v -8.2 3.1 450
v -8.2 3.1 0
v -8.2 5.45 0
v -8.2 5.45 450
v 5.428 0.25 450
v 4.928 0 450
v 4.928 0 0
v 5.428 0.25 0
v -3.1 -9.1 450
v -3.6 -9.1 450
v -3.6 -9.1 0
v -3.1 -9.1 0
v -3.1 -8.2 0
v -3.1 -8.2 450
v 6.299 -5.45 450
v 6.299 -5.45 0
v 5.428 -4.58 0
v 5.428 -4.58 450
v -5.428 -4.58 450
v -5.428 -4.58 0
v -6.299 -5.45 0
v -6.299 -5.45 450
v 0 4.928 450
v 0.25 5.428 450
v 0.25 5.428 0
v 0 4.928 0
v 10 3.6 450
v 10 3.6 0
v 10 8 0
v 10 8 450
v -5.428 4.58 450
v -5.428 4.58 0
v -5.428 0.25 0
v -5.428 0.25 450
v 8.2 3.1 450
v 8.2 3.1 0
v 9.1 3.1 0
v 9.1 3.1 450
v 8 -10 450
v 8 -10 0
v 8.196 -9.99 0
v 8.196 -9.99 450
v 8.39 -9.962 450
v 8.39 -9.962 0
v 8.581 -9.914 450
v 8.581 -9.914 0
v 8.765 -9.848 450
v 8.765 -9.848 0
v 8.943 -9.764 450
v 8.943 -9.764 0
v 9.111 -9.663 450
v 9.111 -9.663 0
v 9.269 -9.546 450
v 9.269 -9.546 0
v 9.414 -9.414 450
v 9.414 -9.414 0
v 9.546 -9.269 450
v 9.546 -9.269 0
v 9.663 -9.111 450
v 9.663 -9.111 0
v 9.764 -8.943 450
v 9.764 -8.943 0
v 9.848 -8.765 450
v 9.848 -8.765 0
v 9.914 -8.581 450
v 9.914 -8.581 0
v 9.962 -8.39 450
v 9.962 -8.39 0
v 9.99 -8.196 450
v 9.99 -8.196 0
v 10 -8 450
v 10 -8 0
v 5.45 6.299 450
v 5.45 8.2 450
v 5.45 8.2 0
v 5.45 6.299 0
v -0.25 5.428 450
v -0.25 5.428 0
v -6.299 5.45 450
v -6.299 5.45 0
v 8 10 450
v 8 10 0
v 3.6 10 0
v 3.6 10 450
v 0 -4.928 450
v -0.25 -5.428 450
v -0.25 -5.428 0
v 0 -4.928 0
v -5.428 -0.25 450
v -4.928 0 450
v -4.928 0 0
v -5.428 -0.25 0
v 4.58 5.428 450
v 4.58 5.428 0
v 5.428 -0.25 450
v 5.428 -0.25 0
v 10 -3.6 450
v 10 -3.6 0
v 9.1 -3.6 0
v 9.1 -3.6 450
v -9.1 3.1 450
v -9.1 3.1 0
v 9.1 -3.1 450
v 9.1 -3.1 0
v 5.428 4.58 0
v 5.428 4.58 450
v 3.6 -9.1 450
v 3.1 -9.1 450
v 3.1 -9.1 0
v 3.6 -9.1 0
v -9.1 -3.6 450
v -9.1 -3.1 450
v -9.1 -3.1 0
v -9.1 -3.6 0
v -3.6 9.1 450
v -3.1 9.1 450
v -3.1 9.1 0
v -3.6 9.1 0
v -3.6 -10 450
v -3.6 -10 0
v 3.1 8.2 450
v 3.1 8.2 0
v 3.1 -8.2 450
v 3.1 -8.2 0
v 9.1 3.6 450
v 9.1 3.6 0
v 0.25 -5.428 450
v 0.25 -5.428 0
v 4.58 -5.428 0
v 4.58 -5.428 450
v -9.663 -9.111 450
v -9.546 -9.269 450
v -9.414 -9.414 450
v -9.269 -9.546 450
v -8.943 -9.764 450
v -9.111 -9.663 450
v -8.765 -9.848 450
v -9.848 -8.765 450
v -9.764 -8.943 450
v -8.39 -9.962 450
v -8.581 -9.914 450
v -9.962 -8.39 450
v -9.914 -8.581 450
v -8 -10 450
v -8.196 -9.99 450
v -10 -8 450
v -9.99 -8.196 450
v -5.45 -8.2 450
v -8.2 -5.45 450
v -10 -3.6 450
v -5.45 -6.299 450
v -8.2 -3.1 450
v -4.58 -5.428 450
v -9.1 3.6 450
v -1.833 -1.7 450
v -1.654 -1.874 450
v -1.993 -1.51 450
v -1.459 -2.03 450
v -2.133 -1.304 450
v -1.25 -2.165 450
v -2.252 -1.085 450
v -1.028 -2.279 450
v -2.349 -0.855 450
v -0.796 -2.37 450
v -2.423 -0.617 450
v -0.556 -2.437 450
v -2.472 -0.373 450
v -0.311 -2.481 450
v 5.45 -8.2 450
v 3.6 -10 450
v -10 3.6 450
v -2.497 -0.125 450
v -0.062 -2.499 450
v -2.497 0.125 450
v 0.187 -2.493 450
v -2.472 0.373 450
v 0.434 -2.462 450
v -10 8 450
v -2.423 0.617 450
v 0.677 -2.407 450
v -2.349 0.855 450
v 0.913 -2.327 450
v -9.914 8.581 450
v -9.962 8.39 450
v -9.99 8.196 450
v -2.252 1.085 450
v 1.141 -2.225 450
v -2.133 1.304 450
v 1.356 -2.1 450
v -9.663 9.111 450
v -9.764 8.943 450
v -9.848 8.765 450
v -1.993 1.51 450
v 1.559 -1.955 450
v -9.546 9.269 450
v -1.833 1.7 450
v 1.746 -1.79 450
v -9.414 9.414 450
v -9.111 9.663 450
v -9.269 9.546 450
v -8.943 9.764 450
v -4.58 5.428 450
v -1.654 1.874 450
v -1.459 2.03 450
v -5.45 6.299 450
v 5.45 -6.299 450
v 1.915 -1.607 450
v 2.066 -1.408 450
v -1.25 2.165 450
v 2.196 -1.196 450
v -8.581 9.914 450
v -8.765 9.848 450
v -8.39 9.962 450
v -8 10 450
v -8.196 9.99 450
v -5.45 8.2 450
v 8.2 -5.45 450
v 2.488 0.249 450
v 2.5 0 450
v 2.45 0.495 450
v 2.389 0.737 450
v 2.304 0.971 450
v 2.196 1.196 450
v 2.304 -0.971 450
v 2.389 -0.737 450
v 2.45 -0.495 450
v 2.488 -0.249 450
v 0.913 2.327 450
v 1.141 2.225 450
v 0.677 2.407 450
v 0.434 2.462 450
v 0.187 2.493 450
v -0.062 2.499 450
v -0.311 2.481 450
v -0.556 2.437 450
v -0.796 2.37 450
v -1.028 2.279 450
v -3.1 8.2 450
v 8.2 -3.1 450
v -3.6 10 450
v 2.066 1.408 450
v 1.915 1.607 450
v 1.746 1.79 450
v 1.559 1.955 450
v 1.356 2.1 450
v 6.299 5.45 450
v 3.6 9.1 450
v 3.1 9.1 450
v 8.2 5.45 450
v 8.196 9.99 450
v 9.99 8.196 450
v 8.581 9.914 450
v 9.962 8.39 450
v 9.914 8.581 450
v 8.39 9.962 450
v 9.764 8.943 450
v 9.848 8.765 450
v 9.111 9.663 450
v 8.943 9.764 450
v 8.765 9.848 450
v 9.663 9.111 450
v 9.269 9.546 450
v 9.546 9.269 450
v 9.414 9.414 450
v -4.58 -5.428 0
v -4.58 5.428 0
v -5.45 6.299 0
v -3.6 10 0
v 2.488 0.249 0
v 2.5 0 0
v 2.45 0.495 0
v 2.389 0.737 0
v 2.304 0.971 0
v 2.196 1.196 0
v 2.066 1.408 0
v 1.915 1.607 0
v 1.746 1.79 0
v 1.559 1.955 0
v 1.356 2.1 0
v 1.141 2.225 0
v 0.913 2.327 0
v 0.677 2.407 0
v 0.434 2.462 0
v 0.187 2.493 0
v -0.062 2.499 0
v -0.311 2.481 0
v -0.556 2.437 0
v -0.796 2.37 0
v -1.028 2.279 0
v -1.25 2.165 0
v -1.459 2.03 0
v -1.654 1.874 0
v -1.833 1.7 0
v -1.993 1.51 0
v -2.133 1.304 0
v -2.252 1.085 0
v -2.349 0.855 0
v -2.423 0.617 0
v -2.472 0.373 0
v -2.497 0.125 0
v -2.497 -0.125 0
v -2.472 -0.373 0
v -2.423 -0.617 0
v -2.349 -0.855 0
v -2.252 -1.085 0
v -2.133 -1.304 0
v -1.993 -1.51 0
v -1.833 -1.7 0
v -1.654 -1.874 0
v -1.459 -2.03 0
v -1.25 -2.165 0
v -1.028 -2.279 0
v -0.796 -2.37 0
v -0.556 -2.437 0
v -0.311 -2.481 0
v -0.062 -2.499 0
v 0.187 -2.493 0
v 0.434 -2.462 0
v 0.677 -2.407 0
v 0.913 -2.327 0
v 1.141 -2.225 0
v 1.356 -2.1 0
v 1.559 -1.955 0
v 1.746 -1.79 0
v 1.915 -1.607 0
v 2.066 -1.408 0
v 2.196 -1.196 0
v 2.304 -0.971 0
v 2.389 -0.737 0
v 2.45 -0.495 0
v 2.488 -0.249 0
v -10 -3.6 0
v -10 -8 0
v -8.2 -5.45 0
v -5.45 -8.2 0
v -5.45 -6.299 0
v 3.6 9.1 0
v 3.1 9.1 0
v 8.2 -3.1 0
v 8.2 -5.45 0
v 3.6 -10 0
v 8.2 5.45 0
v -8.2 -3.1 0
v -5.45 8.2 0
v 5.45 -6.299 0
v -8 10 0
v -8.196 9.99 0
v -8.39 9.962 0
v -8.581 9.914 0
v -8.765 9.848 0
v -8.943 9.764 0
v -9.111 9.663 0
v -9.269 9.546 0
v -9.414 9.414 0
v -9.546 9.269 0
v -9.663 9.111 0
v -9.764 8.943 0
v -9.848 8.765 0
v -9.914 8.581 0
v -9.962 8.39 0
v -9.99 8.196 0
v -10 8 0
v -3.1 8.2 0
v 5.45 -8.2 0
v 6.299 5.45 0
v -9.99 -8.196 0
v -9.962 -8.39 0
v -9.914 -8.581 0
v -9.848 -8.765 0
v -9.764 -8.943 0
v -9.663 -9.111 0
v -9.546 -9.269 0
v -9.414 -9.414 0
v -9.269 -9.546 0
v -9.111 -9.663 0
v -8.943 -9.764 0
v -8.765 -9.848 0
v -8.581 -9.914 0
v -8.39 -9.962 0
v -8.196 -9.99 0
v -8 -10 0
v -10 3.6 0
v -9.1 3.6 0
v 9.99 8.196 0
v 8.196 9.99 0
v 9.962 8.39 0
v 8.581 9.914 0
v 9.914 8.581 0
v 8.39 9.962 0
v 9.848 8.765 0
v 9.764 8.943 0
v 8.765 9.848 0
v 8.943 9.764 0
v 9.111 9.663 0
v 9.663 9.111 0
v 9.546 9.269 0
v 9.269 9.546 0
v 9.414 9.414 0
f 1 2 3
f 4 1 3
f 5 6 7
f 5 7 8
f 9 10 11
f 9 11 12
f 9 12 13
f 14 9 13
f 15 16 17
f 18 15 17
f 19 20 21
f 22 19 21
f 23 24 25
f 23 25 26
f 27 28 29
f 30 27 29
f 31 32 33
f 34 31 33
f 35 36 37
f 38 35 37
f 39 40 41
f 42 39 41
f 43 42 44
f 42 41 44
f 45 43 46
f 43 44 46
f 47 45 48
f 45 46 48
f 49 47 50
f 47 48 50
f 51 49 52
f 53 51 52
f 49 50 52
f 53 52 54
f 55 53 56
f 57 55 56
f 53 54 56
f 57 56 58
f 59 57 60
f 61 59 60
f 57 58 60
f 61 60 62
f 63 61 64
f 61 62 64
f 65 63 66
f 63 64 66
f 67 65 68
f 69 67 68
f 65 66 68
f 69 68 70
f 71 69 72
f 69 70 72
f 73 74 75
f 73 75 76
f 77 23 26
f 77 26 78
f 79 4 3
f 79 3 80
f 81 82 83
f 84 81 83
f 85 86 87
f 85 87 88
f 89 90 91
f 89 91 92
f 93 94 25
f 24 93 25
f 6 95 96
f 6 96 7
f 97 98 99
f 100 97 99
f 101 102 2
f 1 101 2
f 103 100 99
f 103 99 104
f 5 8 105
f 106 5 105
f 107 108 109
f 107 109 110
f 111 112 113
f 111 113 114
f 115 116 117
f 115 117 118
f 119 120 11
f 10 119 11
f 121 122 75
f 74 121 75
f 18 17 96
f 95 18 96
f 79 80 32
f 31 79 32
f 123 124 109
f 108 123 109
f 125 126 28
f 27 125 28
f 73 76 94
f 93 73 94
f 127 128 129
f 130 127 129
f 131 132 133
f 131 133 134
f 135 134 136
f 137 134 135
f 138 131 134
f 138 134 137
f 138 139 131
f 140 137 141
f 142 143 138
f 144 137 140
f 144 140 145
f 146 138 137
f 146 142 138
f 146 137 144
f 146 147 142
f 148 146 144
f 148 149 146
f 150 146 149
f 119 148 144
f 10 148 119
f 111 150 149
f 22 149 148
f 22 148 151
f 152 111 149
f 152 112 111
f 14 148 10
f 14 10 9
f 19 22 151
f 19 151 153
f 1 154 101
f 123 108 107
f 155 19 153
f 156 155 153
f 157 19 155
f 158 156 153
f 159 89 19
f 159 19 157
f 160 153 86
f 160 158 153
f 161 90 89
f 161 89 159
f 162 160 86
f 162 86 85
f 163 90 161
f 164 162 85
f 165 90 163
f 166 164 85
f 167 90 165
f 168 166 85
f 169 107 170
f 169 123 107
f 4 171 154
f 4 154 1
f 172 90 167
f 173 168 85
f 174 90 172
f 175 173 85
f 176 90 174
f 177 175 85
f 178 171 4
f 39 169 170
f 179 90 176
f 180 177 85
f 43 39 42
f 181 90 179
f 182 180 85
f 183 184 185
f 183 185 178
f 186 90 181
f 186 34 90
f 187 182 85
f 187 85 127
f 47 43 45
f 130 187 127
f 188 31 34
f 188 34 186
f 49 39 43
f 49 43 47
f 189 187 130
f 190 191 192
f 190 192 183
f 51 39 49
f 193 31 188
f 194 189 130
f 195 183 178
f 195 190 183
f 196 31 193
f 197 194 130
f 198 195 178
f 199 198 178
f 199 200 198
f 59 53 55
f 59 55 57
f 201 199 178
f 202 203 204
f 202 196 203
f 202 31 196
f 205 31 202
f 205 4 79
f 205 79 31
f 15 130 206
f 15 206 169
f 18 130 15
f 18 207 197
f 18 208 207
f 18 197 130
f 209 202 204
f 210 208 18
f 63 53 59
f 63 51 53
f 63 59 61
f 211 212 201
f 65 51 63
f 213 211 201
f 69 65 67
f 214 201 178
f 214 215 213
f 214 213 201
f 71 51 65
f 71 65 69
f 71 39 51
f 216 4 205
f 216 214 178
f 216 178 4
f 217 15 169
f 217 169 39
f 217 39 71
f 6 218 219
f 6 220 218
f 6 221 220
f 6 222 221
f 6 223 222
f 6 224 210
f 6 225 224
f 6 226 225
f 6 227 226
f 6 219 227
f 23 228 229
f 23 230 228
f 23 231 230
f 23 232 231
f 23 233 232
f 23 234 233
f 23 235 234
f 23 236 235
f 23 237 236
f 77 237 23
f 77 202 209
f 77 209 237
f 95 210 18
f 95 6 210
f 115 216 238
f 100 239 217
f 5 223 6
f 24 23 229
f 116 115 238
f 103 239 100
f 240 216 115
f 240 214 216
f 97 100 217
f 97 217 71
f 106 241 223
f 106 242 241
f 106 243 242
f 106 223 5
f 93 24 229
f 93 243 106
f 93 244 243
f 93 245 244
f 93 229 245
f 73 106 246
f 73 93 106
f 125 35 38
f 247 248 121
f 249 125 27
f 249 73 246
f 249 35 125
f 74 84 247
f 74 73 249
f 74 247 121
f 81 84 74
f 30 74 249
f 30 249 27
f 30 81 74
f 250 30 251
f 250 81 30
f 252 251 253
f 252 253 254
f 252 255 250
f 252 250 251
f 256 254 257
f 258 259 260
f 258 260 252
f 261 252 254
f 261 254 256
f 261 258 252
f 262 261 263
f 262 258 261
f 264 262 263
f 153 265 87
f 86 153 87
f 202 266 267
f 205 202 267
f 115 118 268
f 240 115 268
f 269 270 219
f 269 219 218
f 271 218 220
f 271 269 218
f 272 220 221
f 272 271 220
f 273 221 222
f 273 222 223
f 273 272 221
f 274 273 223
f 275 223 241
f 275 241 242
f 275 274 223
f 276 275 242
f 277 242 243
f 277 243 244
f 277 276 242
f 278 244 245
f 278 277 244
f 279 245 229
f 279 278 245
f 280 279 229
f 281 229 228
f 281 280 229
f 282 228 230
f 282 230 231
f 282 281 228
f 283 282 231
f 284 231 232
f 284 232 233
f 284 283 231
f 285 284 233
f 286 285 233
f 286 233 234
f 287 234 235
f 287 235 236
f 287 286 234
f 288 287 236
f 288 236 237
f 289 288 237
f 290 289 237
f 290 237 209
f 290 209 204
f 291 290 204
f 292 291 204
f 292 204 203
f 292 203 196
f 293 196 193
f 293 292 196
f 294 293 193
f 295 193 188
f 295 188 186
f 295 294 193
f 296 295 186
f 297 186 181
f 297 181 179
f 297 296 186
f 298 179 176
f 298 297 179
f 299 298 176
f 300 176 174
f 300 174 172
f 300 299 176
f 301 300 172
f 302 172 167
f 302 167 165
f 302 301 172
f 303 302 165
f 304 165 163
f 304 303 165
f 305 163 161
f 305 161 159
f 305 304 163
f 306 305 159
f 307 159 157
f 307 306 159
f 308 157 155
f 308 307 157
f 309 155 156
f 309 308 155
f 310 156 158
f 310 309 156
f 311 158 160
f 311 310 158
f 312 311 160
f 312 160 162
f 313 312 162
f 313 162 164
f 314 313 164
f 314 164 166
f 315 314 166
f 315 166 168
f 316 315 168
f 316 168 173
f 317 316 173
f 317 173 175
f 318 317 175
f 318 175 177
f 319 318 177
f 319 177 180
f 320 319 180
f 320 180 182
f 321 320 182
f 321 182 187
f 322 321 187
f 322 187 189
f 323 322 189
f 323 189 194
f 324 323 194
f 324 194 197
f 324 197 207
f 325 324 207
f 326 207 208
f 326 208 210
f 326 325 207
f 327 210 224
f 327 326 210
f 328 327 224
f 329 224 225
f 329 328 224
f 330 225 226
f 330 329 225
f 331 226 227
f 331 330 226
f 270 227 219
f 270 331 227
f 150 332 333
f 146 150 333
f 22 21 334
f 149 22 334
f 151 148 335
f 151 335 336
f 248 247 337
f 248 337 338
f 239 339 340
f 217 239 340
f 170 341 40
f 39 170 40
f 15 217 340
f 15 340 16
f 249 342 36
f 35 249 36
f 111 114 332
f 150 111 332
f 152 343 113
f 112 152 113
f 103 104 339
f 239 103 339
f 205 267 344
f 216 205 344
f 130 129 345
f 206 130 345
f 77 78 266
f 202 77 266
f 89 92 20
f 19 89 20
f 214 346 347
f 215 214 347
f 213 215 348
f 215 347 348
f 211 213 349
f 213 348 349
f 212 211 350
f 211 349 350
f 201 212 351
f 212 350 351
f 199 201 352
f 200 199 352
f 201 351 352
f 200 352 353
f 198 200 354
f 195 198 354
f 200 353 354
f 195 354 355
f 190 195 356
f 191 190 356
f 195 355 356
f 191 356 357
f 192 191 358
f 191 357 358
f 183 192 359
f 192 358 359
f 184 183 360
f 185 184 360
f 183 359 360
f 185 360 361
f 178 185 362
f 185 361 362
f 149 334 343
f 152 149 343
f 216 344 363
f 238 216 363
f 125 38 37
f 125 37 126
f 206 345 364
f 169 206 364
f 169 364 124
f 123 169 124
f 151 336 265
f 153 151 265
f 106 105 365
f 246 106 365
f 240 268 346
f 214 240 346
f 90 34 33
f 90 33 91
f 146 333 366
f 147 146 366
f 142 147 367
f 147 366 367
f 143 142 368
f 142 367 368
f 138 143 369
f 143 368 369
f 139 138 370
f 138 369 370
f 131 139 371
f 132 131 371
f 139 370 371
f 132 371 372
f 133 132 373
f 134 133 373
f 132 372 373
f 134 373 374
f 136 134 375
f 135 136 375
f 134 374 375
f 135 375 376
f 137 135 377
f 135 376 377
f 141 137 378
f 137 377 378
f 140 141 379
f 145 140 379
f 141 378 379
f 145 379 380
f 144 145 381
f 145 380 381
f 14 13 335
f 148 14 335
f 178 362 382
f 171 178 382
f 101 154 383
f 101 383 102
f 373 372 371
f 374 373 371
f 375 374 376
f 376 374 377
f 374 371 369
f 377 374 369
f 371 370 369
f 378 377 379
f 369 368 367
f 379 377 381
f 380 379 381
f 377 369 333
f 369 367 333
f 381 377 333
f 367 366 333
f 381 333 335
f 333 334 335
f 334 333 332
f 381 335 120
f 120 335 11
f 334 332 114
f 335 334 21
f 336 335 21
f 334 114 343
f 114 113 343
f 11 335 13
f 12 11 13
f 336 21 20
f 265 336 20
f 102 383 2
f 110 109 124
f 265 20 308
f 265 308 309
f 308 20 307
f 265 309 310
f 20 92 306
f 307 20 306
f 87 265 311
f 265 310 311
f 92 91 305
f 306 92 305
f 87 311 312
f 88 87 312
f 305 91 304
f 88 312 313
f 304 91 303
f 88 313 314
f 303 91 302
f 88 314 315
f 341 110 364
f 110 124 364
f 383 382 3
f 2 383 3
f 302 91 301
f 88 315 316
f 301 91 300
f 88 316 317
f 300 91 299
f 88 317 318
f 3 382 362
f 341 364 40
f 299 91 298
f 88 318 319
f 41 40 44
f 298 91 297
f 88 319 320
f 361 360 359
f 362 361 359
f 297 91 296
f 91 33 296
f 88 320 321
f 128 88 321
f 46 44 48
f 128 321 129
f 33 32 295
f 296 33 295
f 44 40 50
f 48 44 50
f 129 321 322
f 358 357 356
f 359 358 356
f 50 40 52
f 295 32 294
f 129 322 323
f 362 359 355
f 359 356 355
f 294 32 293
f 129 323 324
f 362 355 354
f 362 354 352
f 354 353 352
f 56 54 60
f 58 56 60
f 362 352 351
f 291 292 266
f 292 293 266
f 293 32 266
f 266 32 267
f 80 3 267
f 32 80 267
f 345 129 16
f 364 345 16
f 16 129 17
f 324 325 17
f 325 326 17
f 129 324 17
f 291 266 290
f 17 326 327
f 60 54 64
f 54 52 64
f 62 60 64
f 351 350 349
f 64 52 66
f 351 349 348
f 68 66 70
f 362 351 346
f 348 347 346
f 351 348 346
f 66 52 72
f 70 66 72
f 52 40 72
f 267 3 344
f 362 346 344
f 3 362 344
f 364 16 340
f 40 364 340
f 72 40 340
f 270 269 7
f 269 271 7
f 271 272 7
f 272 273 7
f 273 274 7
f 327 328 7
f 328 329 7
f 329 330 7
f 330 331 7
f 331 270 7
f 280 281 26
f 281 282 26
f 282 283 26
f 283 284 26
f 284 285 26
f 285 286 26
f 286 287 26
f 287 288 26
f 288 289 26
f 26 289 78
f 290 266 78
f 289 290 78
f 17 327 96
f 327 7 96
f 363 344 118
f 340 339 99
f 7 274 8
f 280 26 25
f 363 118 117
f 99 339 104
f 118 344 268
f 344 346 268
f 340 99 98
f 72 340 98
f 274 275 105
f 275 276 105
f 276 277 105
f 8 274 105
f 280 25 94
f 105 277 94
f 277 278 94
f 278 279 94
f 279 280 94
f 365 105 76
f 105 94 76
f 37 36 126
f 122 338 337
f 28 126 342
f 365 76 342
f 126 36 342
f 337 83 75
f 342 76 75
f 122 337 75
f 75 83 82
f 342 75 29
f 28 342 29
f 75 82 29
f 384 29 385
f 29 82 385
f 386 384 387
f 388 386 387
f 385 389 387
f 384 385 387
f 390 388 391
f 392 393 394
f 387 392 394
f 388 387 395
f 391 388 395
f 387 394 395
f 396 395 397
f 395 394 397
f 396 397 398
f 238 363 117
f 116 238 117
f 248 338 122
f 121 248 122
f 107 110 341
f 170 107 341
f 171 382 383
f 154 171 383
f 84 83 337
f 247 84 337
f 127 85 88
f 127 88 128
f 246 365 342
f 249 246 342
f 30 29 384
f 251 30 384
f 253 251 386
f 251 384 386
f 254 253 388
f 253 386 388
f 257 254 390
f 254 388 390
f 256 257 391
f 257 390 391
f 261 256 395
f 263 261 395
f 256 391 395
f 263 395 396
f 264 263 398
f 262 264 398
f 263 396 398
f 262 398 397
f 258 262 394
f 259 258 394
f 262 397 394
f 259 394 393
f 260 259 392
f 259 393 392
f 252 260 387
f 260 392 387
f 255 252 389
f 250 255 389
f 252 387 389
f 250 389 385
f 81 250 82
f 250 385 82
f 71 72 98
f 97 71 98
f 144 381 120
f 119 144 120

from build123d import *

# Parameters (mm, degrees)
F0_R     = 2.5
F1_DEPTH = 450


with BuildPart() as f1:
    # F0 (on Top) → F1 (new body)
    with BuildSketch(Plane.XY):
        with BuildLine():
            ThreePointArc((10, 8), (9.414214, 9.414214), (8, 10))
            Line((8, 10), (3.6, 10))
            Line((3.6, 10), (3.6, 9.1))
            Line((3.6, 9.1), (3.1, 9.1))
            Line((3.1, 9.1), (3.1, 8.2))
            Line((3.1, 8.2), (5.45, 8.2))
            Line((5.45, 8.2), (5.45, 6.298528))
            Line((5.45, 6.298528), (4.579818, 5.428346))
            Line((4.579818, 5.428346), (0.25, 5.428346))
            Line((0.25, 5.428346), (0, 4.928346))
            Line((0, 4.928346), (-0.25, 5.428346))
            Line((-0.25, 5.428346), (-4.579818, 5.428346))
            Line((-4.579818, 5.428346), (-5.45, 6.298528))
            Line((-5.45, 6.298528), (-5.45, 8.2))
            Line((-5.45, 8.2), (-3.1, 8.2))
            Line((-3.1, 8.2), (-3.1, 9.1))
            Line((-3.1, 9.1), (-3.6, 9.1))
            Line((-3.6, 9.1), (-3.6, 10))
            Line((-3.6, 10), (-8, 10))
            ThreePointArc((-8, 10), (-9.414214, 9.414214), (-10, 8))
            Line((-10, 8), (-10, 3.6))
            Line((-10, 3.6), (-9.1, 3.6))
            Line((-9.1, 3.6), (-9.1, 3.1))
            Line((-9.1, 3.1), (-8.2, 3.1))
            Line((-8.2, 3.1), (-8.2, 5.45))
            Line((-8.2, 5.45), (-6.298528, 5.45))
            Line((-6.298528, 5.45), (-5.428346, 4.579818))
            Line((-5.428346, 4.579818), (-5.428346, 0.25))
            Line((-5.428346, 0.25), (-4.928346, 0))
            Line((-4.928346, 0), (-5.428346, -0.25))
            Line((-5.428346, -0.25), (-5.428346, -4.579818))
            Line((-5.428346, -4.579818), (-6.298528, -5.45))
            Line((-6.298528, -5.45), (-8.2, -5.45))
            Line((-8.2, -5.45), (-8.2, -3.1))
            Line((-8.2, -3.1), (-9.1, -3.1))
            Line((-9.1, -3.1), (-9.1, -3.6))
            Line((-9.1, -3.6), (-10, -3.6))
            Line((-10, -3.6), (-10, -8))
            ThreePointArc((-10, -8), (-9.414214, -9.414214), (-8, -10))
            Line((-8, -10), (-3.6, -10))
            Line((-3.6, -10), (-3.6, -9.1))
            Line((-3.6, -9.1), (-3.1, -9.1))
            Line((-3.1, -9.1), (-3.1, -8.2))
            Line((-3.1, -8.2), (-5.45, -8.2))
            Line((-5.45, -8.2), (-5.45, -6.298528))
            Line((-5.45, -6.298528), (-4.579818, -5.428346))
            Line((-4.579818, -5.428346), (-0.25, -5.428346))
            Line((-0.25, -5.428346), (0, -4.928346))
            Line((0, -4.928346), (0.25, -5.428346))
            Line((0.25, -5.428346), (4.579818, -5.428346))
            Line((4.579818, -5.428346), (5.45, -6.298528))
            Line((5.45, -6.298528), (5.45, -8.2))
            Line((5.45, -8.2), (3.1, -8.2))
            Line((3.1, -8.2), (3.1, -9.1))
            Line((3.1, -9.1), (3.6, -9.1))
            Line((3.6, -9.1), (3.6, -10))
            Line((3.6, -10), (8, -10))
            ThreePointArc((8, -10), (9.414214, -9.414214), (10, -8))
            Line((10, -8), (10, -3.6))
            Line((10, -3.6), (9.1, -3.6))
            Line((9.1, -3.6), (9.1, -3.1))
            Line((9.1, -3.1), (8.2, -3.1))
            Line((8.2, -3.1), (8.2, -5.45))
            Line((8.2, -5.45), (6.298528, -5.45))
            Line((6.298528, -5.45), (5.428346, -4.579818))
            Line((5.428346, -4.579818), (5.428346, -0.25))
            Line((5.428346, -0.25), (4.928346, 0))
            Line((4.928346, 0), (5.428346, 0.25))
            Line((5.428346, 0.25), (5.428346, 4.579818))
            Line((5.428346, 4.579818), (6.298528, 5.45))
            Line((6.298528, 5.45), (8.2, 5.45))
            Line((8.2, 5.45), (8.2, 3.1))
            Line((8.2, 3.1), (9.1, 3.1))
            Line((9.1, 3.1), (9.1, 3.6))
            Line((9.1, 3.6), (10, 3.6))
            Line((10, 3.6), (10, 8))
        make_face()
        Circle(F0_R, mode=Mode.SUBTRACT)
    extrude(amount=F1_DEPTH)


solid = f1.part
